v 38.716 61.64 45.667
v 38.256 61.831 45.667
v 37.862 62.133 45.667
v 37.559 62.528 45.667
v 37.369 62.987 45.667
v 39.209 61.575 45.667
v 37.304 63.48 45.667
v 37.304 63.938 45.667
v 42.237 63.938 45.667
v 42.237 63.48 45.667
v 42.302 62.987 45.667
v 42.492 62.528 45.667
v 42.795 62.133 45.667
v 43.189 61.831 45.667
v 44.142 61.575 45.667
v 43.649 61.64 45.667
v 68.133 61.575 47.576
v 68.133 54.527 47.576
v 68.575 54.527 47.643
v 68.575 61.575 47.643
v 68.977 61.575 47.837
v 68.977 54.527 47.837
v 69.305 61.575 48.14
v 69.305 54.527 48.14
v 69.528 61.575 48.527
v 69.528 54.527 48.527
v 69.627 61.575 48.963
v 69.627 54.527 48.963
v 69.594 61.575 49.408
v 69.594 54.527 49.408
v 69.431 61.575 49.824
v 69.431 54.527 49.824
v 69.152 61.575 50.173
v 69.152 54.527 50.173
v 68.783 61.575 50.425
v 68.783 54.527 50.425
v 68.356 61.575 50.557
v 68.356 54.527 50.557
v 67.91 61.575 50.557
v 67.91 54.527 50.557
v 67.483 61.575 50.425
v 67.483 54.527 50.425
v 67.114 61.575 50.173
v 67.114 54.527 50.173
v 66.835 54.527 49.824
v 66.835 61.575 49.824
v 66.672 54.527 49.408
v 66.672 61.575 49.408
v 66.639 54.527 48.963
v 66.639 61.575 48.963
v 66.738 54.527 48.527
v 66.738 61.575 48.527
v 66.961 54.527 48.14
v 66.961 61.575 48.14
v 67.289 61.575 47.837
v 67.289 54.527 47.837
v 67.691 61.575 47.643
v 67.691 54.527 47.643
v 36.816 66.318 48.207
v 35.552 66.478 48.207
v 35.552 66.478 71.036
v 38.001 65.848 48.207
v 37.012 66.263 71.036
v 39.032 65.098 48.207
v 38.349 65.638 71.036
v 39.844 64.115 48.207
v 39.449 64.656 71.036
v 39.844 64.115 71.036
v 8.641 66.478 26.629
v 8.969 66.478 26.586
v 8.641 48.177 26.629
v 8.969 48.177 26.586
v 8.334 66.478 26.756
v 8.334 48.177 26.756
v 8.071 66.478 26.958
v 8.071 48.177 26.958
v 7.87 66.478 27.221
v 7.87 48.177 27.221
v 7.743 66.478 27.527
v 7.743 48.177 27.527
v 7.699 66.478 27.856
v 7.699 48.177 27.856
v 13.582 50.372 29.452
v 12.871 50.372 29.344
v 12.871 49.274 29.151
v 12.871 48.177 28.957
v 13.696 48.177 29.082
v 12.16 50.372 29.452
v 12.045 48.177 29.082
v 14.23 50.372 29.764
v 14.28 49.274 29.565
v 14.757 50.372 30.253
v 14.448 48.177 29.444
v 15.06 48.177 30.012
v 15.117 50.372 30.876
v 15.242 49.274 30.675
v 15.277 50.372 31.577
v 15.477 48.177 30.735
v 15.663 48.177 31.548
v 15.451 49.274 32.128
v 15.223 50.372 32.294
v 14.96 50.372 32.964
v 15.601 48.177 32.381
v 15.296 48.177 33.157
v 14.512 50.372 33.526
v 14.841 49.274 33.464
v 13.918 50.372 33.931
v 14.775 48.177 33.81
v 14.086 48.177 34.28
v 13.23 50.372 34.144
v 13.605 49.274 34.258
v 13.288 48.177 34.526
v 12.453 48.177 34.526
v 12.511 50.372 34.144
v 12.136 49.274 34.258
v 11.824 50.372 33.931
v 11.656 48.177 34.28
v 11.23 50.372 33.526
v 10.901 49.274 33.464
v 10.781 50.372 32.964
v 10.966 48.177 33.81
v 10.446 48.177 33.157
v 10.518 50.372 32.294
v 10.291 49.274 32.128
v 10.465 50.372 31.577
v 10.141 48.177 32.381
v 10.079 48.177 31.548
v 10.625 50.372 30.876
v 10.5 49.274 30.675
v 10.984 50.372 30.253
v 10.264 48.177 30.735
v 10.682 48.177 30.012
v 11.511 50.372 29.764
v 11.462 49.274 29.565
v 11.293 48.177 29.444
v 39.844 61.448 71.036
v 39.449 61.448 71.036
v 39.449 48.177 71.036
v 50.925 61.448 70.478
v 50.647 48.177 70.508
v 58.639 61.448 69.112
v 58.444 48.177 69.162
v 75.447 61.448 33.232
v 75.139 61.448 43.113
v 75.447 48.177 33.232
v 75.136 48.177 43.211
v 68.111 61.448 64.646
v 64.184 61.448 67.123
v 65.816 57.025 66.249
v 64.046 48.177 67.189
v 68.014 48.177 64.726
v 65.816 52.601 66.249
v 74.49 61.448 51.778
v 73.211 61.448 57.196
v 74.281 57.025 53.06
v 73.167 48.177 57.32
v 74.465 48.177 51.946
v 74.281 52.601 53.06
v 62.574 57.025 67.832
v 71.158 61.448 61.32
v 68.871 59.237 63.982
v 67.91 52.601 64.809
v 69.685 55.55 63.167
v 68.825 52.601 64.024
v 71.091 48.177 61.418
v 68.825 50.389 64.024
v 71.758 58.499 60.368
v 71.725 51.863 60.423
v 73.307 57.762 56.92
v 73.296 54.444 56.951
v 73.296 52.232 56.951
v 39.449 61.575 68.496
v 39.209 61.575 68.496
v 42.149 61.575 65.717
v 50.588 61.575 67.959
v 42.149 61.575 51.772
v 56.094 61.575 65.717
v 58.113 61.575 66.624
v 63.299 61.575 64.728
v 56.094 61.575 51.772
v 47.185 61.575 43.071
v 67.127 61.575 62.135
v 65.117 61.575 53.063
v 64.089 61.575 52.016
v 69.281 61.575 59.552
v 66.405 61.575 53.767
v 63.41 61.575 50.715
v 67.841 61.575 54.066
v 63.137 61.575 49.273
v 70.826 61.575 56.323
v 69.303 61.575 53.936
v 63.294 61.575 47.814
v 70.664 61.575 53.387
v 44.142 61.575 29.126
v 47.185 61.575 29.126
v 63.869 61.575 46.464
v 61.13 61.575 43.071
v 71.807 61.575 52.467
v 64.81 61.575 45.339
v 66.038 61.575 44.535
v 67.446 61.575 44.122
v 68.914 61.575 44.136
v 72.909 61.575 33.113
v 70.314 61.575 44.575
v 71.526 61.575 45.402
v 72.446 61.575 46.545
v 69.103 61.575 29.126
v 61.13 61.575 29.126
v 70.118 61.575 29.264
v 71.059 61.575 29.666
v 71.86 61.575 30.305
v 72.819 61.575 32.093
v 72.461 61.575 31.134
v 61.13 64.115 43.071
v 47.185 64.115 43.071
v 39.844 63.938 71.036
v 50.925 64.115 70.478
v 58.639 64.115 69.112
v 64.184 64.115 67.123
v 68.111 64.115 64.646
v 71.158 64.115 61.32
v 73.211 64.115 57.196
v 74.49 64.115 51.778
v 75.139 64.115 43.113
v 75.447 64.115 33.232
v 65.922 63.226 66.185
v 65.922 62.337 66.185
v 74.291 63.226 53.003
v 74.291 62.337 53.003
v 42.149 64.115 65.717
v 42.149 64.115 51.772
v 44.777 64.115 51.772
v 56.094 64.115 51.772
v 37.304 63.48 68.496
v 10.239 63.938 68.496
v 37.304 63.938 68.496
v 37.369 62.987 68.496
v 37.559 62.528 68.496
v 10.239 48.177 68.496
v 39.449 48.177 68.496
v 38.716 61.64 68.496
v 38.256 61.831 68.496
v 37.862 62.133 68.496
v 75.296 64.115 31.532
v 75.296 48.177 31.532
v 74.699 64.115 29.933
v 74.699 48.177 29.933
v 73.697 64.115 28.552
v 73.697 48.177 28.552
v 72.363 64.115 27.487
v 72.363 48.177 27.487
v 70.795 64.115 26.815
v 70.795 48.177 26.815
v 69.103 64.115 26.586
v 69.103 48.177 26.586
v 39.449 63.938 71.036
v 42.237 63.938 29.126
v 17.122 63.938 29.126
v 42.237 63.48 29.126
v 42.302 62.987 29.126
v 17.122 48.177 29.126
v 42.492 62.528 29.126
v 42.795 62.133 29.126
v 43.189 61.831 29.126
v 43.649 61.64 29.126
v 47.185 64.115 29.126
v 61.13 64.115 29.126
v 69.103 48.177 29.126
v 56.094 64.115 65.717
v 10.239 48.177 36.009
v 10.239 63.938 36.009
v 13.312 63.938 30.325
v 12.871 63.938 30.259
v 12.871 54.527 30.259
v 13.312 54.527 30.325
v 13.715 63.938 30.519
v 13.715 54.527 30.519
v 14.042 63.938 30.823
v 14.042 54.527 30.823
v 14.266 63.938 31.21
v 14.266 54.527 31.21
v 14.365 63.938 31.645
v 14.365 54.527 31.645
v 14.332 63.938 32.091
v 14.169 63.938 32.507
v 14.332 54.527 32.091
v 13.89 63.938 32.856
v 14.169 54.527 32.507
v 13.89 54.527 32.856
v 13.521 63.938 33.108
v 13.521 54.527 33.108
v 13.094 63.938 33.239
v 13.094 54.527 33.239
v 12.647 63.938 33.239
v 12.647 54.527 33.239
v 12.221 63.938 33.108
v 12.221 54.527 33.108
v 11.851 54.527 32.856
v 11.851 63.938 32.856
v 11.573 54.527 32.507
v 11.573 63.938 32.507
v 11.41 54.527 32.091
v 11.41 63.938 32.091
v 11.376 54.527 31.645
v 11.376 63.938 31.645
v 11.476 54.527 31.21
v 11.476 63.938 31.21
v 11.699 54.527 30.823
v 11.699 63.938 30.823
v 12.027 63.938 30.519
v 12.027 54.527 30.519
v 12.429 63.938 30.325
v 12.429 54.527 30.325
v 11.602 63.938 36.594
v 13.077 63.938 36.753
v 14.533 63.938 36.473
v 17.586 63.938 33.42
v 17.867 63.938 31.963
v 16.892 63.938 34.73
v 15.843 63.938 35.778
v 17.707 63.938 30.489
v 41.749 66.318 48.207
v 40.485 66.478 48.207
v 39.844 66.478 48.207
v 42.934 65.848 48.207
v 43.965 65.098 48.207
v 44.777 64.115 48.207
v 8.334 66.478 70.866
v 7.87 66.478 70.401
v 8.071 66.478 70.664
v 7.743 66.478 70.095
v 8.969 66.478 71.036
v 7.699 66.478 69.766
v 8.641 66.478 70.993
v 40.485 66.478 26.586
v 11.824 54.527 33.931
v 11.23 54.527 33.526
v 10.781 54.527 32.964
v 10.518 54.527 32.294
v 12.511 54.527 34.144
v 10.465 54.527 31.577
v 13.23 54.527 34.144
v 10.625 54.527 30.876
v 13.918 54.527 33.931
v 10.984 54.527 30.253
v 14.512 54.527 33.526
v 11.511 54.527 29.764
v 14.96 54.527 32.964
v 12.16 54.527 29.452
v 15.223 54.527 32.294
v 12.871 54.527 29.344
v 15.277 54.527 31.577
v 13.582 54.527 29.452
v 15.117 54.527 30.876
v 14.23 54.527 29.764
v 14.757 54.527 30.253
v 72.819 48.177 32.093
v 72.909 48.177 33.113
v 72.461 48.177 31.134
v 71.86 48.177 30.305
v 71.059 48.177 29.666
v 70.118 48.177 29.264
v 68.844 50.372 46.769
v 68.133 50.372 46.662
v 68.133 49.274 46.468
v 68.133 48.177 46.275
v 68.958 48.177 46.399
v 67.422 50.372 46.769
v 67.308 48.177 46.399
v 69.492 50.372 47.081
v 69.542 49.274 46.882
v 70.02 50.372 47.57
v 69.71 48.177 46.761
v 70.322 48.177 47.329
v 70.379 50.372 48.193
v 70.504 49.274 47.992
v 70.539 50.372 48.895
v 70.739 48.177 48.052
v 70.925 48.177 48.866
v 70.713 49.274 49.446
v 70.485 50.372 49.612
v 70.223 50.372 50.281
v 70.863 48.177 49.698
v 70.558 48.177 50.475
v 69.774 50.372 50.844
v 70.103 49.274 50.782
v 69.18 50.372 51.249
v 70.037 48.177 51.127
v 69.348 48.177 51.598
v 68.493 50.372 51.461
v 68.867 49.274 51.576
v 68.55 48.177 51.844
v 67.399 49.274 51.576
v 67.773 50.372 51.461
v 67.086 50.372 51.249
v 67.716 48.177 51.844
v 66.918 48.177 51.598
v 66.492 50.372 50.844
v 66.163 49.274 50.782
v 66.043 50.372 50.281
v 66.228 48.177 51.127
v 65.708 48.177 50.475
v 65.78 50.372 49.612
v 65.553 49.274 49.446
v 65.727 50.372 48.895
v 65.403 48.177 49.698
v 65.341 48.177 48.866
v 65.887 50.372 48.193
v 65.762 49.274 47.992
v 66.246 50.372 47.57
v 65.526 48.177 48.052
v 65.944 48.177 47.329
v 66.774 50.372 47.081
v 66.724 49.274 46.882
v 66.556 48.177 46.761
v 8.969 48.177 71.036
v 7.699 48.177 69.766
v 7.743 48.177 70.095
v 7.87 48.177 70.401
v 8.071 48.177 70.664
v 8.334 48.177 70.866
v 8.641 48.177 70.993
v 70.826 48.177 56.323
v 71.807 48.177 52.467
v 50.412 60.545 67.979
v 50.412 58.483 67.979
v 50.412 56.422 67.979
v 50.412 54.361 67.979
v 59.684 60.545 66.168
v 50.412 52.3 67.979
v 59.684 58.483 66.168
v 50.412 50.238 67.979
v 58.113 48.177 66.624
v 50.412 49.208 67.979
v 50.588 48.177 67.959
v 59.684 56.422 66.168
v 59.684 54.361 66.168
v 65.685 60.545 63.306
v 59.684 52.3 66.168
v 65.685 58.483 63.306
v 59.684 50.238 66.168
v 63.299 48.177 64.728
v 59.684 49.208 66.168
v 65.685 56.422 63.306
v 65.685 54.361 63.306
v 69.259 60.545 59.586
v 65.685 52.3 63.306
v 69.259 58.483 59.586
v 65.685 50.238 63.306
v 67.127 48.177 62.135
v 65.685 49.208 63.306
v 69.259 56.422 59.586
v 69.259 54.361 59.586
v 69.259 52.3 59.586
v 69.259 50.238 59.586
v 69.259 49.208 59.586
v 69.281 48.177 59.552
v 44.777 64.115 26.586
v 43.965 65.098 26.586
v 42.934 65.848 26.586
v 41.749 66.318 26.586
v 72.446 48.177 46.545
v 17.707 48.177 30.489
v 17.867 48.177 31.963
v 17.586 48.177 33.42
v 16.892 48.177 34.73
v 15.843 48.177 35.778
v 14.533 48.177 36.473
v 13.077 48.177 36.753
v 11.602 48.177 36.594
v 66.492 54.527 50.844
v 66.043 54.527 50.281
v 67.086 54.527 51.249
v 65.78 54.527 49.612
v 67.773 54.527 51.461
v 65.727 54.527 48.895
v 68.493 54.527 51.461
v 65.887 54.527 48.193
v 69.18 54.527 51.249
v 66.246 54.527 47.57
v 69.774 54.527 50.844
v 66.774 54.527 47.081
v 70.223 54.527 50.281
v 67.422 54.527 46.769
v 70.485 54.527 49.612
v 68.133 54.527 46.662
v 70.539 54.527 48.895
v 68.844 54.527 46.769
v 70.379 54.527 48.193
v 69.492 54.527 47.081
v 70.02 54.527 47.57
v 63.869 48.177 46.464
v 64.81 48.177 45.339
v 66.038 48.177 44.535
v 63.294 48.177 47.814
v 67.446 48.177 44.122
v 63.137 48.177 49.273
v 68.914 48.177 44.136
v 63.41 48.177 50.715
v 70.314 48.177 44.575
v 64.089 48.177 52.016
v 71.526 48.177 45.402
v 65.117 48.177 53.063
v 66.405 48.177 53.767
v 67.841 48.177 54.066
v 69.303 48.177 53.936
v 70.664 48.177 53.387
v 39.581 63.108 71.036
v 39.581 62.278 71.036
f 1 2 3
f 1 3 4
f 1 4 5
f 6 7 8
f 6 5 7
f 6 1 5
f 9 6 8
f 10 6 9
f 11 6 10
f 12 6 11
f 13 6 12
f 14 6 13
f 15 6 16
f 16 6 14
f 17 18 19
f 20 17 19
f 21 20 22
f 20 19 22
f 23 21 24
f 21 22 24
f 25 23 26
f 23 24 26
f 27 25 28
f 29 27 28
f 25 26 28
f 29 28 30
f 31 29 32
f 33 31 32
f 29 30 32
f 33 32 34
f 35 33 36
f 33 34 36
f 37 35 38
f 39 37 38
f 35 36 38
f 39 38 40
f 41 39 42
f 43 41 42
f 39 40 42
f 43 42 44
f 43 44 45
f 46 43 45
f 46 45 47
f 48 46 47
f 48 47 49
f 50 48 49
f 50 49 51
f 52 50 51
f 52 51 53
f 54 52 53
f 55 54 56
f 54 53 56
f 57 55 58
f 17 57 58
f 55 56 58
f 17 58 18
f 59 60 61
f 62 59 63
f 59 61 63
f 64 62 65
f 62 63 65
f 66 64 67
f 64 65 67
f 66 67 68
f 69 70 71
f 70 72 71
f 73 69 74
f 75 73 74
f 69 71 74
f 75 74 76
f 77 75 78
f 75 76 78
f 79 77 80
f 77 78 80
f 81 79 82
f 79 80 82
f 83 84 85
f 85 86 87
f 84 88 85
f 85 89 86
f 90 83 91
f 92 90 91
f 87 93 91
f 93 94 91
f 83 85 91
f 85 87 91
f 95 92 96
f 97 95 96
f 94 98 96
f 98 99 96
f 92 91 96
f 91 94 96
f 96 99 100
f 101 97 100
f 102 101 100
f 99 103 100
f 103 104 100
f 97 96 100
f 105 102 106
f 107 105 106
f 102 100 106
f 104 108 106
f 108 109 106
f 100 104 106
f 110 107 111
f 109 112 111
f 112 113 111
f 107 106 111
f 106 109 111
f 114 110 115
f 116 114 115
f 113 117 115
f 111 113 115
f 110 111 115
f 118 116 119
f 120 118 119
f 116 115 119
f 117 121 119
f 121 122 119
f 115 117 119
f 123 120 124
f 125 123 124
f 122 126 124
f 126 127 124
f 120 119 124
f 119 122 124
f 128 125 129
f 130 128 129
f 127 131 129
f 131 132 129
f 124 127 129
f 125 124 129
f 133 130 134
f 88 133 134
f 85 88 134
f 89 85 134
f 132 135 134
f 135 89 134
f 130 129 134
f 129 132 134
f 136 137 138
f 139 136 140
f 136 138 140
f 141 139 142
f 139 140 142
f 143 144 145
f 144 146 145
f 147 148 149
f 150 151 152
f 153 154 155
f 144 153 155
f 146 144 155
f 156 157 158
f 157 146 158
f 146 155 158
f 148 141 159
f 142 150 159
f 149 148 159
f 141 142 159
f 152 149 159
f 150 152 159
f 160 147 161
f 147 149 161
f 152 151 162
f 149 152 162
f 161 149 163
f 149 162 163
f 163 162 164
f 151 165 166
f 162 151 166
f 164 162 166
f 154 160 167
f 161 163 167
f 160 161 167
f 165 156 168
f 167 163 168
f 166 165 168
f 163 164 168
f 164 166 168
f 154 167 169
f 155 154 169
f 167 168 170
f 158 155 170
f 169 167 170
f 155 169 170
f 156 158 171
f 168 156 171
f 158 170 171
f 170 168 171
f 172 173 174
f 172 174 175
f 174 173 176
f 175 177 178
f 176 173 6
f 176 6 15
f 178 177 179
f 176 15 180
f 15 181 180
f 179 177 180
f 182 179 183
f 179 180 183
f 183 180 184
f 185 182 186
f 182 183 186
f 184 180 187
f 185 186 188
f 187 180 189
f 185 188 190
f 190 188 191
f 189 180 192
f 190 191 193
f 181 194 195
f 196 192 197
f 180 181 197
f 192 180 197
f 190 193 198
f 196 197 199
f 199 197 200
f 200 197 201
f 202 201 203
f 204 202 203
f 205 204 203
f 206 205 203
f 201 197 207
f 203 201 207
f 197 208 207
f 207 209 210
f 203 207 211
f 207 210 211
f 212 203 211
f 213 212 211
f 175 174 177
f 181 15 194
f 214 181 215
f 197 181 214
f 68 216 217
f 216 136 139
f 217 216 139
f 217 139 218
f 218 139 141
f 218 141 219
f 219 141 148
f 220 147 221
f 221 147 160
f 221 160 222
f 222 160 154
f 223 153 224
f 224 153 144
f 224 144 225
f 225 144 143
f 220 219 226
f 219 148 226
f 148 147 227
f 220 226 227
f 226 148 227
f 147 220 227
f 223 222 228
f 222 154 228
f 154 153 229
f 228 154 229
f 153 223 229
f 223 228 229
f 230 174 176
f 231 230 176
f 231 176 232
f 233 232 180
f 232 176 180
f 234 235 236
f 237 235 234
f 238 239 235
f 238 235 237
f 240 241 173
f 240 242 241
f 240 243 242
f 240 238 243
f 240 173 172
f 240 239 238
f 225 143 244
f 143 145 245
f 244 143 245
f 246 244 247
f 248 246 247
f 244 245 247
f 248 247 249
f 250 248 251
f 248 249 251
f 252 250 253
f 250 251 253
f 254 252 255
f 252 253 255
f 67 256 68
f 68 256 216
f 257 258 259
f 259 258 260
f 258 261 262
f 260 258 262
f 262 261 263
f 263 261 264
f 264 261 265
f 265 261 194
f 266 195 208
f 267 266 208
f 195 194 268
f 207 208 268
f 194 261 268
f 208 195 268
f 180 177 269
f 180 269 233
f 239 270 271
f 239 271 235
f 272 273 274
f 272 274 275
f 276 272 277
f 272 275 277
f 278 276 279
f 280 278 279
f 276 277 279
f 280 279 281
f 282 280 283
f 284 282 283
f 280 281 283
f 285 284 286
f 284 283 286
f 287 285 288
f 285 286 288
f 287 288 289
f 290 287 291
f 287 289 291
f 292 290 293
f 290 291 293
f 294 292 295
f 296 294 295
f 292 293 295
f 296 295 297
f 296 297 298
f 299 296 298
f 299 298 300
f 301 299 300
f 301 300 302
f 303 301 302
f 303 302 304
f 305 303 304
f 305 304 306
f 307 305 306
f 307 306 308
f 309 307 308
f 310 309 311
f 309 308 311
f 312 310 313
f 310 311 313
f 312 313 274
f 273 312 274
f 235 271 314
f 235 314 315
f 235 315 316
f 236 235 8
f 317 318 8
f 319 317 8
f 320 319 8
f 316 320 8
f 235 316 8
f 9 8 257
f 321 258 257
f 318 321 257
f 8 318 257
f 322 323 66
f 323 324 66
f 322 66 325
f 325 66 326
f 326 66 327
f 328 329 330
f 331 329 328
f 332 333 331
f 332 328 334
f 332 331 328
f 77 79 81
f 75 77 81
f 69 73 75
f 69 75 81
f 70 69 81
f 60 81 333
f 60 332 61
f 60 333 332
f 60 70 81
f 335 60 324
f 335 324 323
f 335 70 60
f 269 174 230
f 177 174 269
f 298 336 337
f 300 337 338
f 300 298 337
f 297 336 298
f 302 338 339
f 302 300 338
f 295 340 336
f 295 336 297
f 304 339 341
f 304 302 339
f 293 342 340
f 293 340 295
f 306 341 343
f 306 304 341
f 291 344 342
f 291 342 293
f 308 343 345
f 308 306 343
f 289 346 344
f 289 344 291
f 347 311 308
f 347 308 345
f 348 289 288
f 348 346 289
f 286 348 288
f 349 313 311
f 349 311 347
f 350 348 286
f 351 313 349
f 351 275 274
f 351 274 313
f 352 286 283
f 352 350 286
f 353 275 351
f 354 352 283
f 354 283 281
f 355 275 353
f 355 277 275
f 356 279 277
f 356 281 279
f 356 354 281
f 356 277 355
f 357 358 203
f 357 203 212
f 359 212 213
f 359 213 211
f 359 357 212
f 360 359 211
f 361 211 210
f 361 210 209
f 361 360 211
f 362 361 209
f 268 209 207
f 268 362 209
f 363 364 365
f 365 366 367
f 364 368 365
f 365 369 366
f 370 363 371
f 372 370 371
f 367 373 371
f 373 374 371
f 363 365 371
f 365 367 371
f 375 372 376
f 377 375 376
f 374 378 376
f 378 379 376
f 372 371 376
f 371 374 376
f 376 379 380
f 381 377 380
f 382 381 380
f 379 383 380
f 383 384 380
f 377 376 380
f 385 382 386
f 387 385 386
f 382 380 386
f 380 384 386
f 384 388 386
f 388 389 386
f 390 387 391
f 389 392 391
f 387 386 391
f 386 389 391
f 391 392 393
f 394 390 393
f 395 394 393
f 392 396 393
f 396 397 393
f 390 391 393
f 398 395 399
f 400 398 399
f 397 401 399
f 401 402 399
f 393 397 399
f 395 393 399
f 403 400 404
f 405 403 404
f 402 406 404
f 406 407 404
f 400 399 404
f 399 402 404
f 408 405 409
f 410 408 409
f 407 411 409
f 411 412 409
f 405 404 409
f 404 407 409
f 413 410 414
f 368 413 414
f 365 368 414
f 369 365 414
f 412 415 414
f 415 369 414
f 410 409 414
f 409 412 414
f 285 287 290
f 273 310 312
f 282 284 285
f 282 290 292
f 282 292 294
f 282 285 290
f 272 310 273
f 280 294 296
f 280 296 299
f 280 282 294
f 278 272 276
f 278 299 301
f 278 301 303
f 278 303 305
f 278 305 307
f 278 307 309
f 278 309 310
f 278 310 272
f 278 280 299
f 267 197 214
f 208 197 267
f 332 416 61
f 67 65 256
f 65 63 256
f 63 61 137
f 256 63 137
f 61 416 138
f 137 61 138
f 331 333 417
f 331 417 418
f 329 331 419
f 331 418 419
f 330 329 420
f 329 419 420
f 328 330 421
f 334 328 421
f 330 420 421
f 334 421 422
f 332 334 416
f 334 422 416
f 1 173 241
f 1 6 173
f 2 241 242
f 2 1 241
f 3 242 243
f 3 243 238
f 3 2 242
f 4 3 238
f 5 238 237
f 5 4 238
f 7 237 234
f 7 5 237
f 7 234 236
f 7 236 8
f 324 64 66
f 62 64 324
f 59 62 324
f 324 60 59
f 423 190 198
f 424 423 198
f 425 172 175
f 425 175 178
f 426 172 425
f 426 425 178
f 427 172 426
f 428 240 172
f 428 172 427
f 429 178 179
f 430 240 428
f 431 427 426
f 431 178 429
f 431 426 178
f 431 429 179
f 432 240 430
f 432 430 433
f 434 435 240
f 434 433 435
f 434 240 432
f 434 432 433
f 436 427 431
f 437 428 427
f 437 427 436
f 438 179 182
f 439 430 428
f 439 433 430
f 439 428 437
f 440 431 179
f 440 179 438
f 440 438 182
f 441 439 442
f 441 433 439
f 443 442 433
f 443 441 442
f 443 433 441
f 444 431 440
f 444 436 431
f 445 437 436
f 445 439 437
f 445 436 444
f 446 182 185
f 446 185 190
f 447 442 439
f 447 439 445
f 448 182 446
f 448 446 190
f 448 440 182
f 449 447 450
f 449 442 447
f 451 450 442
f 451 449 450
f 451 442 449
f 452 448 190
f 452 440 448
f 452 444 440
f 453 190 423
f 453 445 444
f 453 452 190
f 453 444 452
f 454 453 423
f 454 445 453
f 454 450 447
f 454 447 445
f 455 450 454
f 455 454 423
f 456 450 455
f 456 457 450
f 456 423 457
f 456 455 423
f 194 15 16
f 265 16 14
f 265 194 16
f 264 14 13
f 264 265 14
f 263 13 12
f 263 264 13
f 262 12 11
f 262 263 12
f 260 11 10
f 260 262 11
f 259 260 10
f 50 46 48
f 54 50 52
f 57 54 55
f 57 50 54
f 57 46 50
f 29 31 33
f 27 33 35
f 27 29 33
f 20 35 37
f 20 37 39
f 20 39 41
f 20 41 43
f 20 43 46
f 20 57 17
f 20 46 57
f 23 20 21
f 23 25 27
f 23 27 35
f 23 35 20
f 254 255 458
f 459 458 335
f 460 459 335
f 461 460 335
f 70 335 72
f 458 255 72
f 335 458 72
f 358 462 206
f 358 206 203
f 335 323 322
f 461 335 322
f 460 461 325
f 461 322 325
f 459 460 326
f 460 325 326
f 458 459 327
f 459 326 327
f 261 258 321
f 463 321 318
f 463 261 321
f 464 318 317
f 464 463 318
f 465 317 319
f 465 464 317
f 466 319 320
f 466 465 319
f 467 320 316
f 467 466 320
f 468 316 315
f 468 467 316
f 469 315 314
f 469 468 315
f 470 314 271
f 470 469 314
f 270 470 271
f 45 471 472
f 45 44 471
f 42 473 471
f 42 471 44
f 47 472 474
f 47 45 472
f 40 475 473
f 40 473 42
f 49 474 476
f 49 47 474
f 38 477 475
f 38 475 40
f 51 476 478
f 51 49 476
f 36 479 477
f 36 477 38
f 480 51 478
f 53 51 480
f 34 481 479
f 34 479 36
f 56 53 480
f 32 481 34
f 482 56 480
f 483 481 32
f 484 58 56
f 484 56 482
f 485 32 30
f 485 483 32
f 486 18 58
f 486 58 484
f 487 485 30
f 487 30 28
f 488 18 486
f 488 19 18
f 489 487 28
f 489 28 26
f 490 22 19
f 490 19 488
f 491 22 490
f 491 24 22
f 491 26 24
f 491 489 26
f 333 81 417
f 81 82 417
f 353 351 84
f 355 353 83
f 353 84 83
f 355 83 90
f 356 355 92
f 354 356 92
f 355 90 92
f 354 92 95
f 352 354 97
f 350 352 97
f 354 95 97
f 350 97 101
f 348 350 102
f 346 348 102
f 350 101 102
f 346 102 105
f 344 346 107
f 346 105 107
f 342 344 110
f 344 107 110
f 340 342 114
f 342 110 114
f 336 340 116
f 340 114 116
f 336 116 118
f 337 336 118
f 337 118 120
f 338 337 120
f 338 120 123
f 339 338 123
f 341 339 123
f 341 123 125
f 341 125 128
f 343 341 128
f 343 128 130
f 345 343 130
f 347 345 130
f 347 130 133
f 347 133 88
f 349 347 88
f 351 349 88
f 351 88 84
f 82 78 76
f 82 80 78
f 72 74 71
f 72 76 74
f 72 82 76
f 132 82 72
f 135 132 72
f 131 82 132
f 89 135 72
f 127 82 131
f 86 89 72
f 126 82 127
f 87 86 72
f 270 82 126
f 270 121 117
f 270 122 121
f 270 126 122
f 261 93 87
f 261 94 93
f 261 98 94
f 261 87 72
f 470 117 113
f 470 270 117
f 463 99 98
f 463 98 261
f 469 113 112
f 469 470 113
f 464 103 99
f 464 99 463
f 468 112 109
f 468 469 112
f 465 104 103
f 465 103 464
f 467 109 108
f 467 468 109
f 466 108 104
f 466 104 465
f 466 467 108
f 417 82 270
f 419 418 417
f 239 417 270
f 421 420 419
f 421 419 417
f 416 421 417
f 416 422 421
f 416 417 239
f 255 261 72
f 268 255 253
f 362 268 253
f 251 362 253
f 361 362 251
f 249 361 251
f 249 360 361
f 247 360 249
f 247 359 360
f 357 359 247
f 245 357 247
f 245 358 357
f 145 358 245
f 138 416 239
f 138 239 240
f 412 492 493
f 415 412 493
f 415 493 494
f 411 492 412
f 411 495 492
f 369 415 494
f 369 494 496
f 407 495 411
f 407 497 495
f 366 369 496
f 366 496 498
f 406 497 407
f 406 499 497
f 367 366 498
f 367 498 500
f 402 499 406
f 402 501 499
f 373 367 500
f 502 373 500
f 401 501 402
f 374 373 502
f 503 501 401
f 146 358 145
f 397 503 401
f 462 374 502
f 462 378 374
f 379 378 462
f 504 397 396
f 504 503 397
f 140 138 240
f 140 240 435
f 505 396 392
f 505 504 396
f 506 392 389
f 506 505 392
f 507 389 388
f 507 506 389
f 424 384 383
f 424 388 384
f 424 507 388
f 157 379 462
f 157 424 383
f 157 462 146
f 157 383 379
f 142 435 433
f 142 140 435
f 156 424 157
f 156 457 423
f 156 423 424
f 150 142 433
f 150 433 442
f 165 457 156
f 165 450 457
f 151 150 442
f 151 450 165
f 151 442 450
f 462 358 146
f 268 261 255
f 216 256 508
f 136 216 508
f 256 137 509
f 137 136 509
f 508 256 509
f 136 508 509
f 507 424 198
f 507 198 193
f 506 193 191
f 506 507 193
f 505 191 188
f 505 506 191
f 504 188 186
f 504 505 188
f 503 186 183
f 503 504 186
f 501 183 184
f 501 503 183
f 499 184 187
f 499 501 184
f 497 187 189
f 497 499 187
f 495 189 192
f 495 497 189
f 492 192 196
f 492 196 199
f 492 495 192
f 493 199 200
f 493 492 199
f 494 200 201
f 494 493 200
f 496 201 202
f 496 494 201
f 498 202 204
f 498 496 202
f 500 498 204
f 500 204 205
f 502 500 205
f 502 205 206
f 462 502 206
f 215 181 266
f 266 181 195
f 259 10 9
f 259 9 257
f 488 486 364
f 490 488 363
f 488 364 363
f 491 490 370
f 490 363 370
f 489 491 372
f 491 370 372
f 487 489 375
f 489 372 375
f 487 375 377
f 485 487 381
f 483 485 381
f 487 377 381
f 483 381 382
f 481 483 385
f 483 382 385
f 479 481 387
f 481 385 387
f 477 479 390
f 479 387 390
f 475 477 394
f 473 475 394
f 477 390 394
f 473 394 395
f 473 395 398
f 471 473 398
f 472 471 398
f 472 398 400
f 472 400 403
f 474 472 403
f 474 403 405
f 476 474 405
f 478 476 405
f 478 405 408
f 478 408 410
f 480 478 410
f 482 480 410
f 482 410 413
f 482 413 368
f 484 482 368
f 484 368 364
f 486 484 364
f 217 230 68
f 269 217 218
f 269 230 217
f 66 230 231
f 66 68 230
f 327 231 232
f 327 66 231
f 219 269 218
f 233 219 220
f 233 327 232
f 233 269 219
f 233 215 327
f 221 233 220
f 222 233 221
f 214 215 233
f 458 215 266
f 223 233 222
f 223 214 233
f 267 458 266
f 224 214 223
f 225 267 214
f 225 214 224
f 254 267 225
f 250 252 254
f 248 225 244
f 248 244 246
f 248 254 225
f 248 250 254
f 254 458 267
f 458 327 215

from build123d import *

# Parameters (mm, degrees)
BUTTONHEIGHTADJUSTMENT_DEPTH          = 13.2715
DUPONTCONNECTORHEIGHTADJUSTMENT_DEPTH = 2.4892
ADDINGTOPTHICKNESS_DUPONT_DEPTH       = 2.54
ADDINGTOPTHICKNESS_BUTTON_DEPTH       = 2.667
SHELL1_START                          = 48.176932074
SHELL1_DEPTH                          = 13.3985
SHELL1_START_2                        = 61.575432074
SHELL1_2_DEPTH                        = 2.3622
BUTTONOPENINGS_DEPTH                  = 105.849340515
BUTTONOPENINGS_DEPTH_BACK             = 105.849340515
SKETCH4_W                             = 13.944930934
SKETCH4_H                             = 13.944930934
SKETCH4_W_2                           = 13.944930933
FILLET1_R                             = 5.08
FILLET2_R                             = 5.08
FILLET3_R                             = 1.905
BOSS_EXTRUDE5_REACH                   = 107.234
SKETCH7_R                             = 5
SKETCH7_3_R                           = 2.413
CUT_EXTRUDE2_DEPTH                    = 6.35
SKETCH8_R                             = 1.4986
CUT_EXTRUDE3_DEPTH                    = 9.4107
SKETCH8_3_R                           = 1.4986
CUT_EXTRUDE4_DEPTH                    = 7.0485


# Read off the part's stored shape, not the designer's step: Shell1
with BuildPart() as part:
    # Sketch1 → ButtonHeightAdjustment (new body)
    with BuildSketch(Plane(origin=(0, 48.176932074, 0), x_dir=(1, 0, 0), z_dir=(0, 1, 0))):
        with BuildLine():
            Line((7.699380634, -27.856075324), (7.699380634, -69.766075324))
            ThreePointArc((7.699380634, -69.766075324), (8.071355022, -70.664100937), (8.969380634, -71.036075324))
            Line((8.969380634, -71.036075324), (39.449380634, -71.036075324))
            add(Edge.make_bspline(
                [(39.449380634, -71.036075324), (78.302087084, -71.036075324), (74.39537319, -55.792900821), (75.446576955, -33.231621959)],
                knots=[0.087040061, 0.087040061, 0.087040061, 0.087040061, 1, 1, 1, 1], degree=3))
            ThreePointArc((75.446576955, -33.231621959), (73.696889706, -28.551683755), (69.103458465, -26.586075324))
            Line((69.103458465, -26.586075324), (8.969380634, -26.586075324))
            ThreePointArc((8.969380634, -26.586075324), (8.071355022, -26.958049712), (7.699380634, -27.856075324))
        make_face()
    extrude(amount=BUTTONHEIGHTADJUSTMENT_DEPTH)

    # Sketch2 → DupontConnectorHeightAdjustment (add)
    with BuildSketch(Plane(origin=(0, 61.448432074, 0), x_dir=(1, 0, 0), z_dir=(0, 1, 0))):
        with BuildLine():
            add(Edge.make_bspline(
                [(39.449380634, -71.036075324), (39.581316275, -71.036075324), (39.712758839, -71.035899549), (39.843710197, -71.03554831)],
                knots=[0.087040061, 0.087040061, 0.087040061, 0.087040061, 0.090140281, 0.090140281, 0.090140281, 0.090140281], degree=3))
            Line((39.843710197, -71.03554831), (39.843710197, -48.207398996))
            Line((39.843710197, -48.207398996), (44.776624411, -48.207398996))
            Line((44.776624411, -48.207398996), (44.776624411, -26.586075324))
            Line((44.776624411, -26.586075324), (8.969380634, -26.586075324))
            ThreePointArc((8.969380634, -26.586075324), (8.071355022, -26.958049712), (7.699380634, -27.856075324))
            Line((7.699380634, -27.856075324), (7.699380634, -69.766075324))
            ThreePointArc((7.699380634, -69.766075324), (8.071355022, -70.664100937), (8.969380634, -71.036075324))
            Line((8.969380634, -71.036075324), (39.449380634, -71.036075324))
        make_face()
    extrude(amount=DUPONTCONNECTORHEIGHTADJUSTMENT_DEPTH)

    # Sketch3 → AddingTopThickness_Dupont (add)
    with BuildSketch(Plane(origin=(0, 63.937632074, 0), x_dir=(1, 0, 0), z_dir=(0, 1, 0))):
        with BuildLine():
            Line((39.843710197, -48.207398996), (44.776624411, -48.207398996))
            Line((44.776624411, -48.207398996), (44.776624411, -26.586075324))
            Line((44.776624411, -26.586075324), (8.969380634, -26.586075324))
            ThreePointArc((8.969380634, -26.586075324), (8.071355022, -26.958049712), (7.699380634, -27.856075324))
            Line((7.699380634, -27.856075324), (7.699380634, -69.766075324))
            ThreePointArc((7.699380634, -69.766075324), (8.071355022, -70.664100937), (8.969380634, -71.036075324))
            Line((8.969380634, -71.036075324), (39.449380634, -71.036075324))
            add(Edge.make_bspline(
                [(39.449380634, -71.036075324), (39.581316276, -71.036075324), (39.712758842, -71.035899549), (39.8437102, -71.03554831)],
                knots=[0.087040061, 0.087040061, 0.087040061, 0.087040061, 0.090140281, 0.090140281, 0.090140281, 0.090140281], degree=3))
            Line((39.8437102, -71.03554831), (39.843710197, -48.207398996))
        make_face()
    extrude(amount=ADDINGTOPTHICKNESS_DUPONT_DEPTH)

    # Sketch5 → AddingTopThickness_Button (add)
    with BuildSketch(Plane(origin=(0, 61.448432074, 0), x_dir=(1, 0, 0), z_dir=(0, 1, 0))):
        with BuildLine():
            Line((39.843710197, -48.207398996), (39.8437102, -71.03554831))
            add(Edge.make_bspline(
                [(39.8437102, -71.03554831), (78.275611493, -70.93246569), (74.398942858, -55.71628745), (75.446576955, -33.231621959)],
                knots=[0.090140281, 0.090140281, 0.090140281, 0.090140281, 1, 1, 1, 1], degree=3))
            ThreePointArc((75.446576955, -33.231621959), (73.696889706, -28.551683755), (69.103458465, -26.586075324))
            Line((69.103458465, -26.586075324), (44.776624411, -26.586075324))
            Line((44.776624411, -26.586075324), (44.776624411, -48.207398996))
            Line((44.776624411, -48.207398996), (39.843710197, -48.207398996))
        make_face()
    extrude(amount=ADDINGTOPTHICKNESS_BUTTON_DEPTH)

    # Shell1 outline → Shell1 (cut)
    with BuildSketch(Plane(origin=(0, 0, 0), x_dir=(1, 0, 0), z_dir=(0, 1, 0)).offset(SHELL1_START)):
        with BuildLine():
            add(Edge.make_bspline(
                [(39.449379827, -68.496075324), (39.449586547, -68.496075324), (39.449791514, -68.496075324), (39.449995043, -68.496075324), (39.450199135, -68.496075323), (39.450405991, -68.496075321), (39.450613287, -68.49607532), (39.450814961, -68.496075318), (39.45101783, -68.496075316), (39.451228774, -68.496075313), (39.451429783, -68.49607531), (39.451635772, -68.496075307), (39.452137481, -68.496075299), (39.452434182, -68.496075293), (39.452730881, -68.496075287), (39.453027578, -68.49607528), (39.453324273, -68.496075272), (39.453620966, -68.496075264), (39.453917657, -68.496075255), (39.454214347, -68.496075245), (39.454511034, -68.496075235), (39.454807719, -68.496075224), (39.455104403, -68.496075212), (39.455994447, -68.496075176), (39.456587802, -68.496075149), (39.45718115, -68.496075119), (39.45777449, -68.496075087), (39.458367822, -68.496075051), (39.458961146, -68.496075014), (39.459554462, -68.496074974), (39.460147771, -68.496074931), (39.460741072, -68.496074885), (39.461334366, -68.496074837), (39.461927651, -68.496074786), (39.463707485, -68.496074626), (39.46489401, -68.496074509), (39.466080504, -68.496074381), (39.467266967, -68.496074242), (39.468453399, -68.496074094), (39.4696398, -68.496073934), (39.47082617, -68.496073764), (39.472012509, -68.496073584), (39.473198817, -68.496073393), (39.474385095, -68.496073191), (39.475571341, -68.496072979), (39.479129987, -68.496072311), (39.481502294, -68.496071824), (39.483874478, -68.496071295), (39.486246537, -68.496070723), (39.488618473, -68.49607011), (39.490990286, -68.496069454), (39.493361974, -68.496068756), (39.495733539, -68.496068017), (39.49810498, -68.496067235), (39.500476297, -68.496066411), (39.50284749, -68.496065545), (39.514702839, -68.496061004), (39.524185139, -68.496056698), (39.53366546, -68.496051718), (39.543143801, -68.496046066), (39.552620163, -68.49603974), (39.562094547, -68.496032741), (39.571566952, -68.496025069), (39.581037379, -68.496016724), (39.590505827, -68.496007706), (39.599972298, -68.495998014), (39.609436791, -68.49598765), (39.656749367, -68.495932466), (39.694567786, -68.495877552), (39.732354575, -68.495811875), (39.770109747, -68.495735439), (39.807833313, -68.495648246), (39.845525286, -68.495550299), (39.883185678, -68.495441603), (39.9208145, -68.495322159), (39.958411766, -68.495191972), (39.995977486, -68.495051044), (40.033511673, -68.494899378), (40.146019672, -68.494412178), (40.22089892, -68.49404444), (40.295652182, -68.49363379), (40.370279553, -68.493180254), (40.444781129, -68.492683856), (40.519157007, -68.492144625), (40.593407283, -68.491562584), (40.667532053, -68.49093776), (40.741531414, -68.490270178), (40.815405462, -68.489559865), (40.889154293, -68.488806846), (41.257272849, -68.484828347), (41.549765836, -68.480962528), (41.840263075, -68.476415439), (42.128770675, -68.471188833), (42.415294743, -68.46528446), (42.699841389, -68.458704073), (42.982416721, -68.451449422), (43.263026848, -68.443522258), (43.541677878, -68.434924334), (43.81837592, -68.425657399), (44.093127082, -68.415723207), (44.911558257, -68.383924109), (45.449415797, -68.360063452), (45.979558488, -68.333556107), (46.502034658, -68.304417105), (47.016892561, -68.272661946), (47.524180382, -68.238306591), (48.023946236, -68.201367465), (48.516238167, -68.161861458), (49.001104147, -68.119805924), (49.478592082, -68.075218681), (49.948749802, -68.028118011), (51.337375611, -67.879331956), (52.233996985, -67.770162893), (53.10187272, -67.65116783), (53.941387356, -67.522507203), (54.752927499, -67.384351455), (55.536883515, -67.23688237), (56.29365187, -67.080293824), (57.023638097, -66.914791937), (57.72726042, -66.740594643), (58.404954001, -66.557930666), (59.057175843, -66.367037906), (60.938879277, -65.770407902), (62.093404567, -65.34071881), (63.151826299, -64.881036106), (64.118529707, -64.39342752), (64.99834488, -63.879851847), (65.796921512, -63.342095032), (66.520883858, -62.781316869), (67.177505422, -62.197416382), (67.77398037, -61.588740771), (68.316609285, -60.952528366), (68.810360599, -60.285890342), (70.157226589, -58.18651634), (70.875939498, -56.654313157), (71.447642543, -54.967962519), (71.889256902, -53.108637628), (72.201031894, -51.080028633), (72.410024806, -48.90317794), (72.536553408, -46.578549842), (72.608216265, -44.123137631), (72.652402144, -41.540781475), (72.697717647, -38.840812898), (72.773461503, -36.029447938), (72.909329559, -33.113403305)],
                knots=[0.087040061, 0.087040061, 0.087040061, 0.087040061, 0.087040061, 0.087040061, 0.087040061, 0.087040061, 0.087040061, 0.087040061, 0.087040061, 0.087040061, 0.087040061, 0.087059666, 0.087059666, 0.087059666, 0.087059666, 0.087059666, 0.087059666, 0.087059666, 0.087059666, 0.087059666, 0.087059666, 0.087059666, 0.08708804, 0.08708804, 0.08708804, 0.08708804, 0.08708804, 0.08708804, 0.08708804, 0.08708804, 0.08708804, 0.08708804, 0.08708804, 0.087144789, 0.087144789, 0.087144789, 0.087144789, 0.087144789, 0.087144789, 0.087144789, 0.087144789, 0.087144789, 0.087144789, 0.087144789, 0.087258286, 0.087258286, 0.087258286, 0.087258286, 0.087258286, 0.087258286, 0.087258286, 0.087258286, 0.087258286, 0.087258286, 0.087258286, 0.087485279, 0.087485279, 0.087485279, 0.087485279, 0.087485279, 0.087485279, 0.087485279, 0.087485279, 0.087485279, 0.087485279, 0.087485279, 0.088393254, 0.088393254, 0.088393254, 0.088393254, 0.088393254, 0.088393254, 0.088393254, 0.088393254, 0.088393254, 0.088393254, 0.088393254, 0.092025154, 0.092025154, 0.092025154, 0.092025154, 0.092025154, 0.092025154, 0.092025154, 0.092025154, 0.092025154, 0.092025154, 0.092025154, 0.099288952, 0.099288952, 0.099288952, 0.099288952, 0.099288952, 0.099288952, 0.099288952, 0.099288952, 0.099288952, 0.099288952, 0.099288952, 0.128344147, 0.128344147, 0.128344147, 0.128344147, 0.128344147, 0.128344147, 0.128344147, 0.128344147, 0.128344147, 0.128344147, 0.128344147, 0.186454538, 0.186454538, 0.186454538, 0.186454538, 0.186454538, 0.186454538, 0.186454538, 0.186454538, 0.186454538, 0.186454538, 0.186454538, 0.302675318, 0.302675318, 0.302675318, 0.302675318, 0.302675318, 0.302675318, 0.302675318, 0.302675318, 0.302675318, 0.302675318, 0.302675318, 0.535116879, 0.535116879, 0.535116879, 0.535116879, 0.535116879, 0.535116879, 0.535116879, 0.535116879, 0.535116879, 0.535116879, 0.535116879, 1, 1, 1, 1, 1, 1, 1, 1, 1, 1, 1, 1, 1], degree=12))
            ThreePointArc((72.909329559, -33.113403305), (71.859517209, -30.305440383), (69.103458465, -29.126075324))
            Line((69.103458465, -29.126075324), (10.239380634, -29.126075324))
            Line((10.239380634, -29.126075324), (10.239380634, -68.496075324))
            Line((10.239380634, -68.496075324), (39.449379827, -68.496075324))
        make_face()
    extrude(amount=SHELL1_DEPTH, mode=Mode.SUBTRACT)

    # Shell1 2 outline → Shell1 2 (cut)
    with BuildSketch(Plane(origin=(0, 0, 0), x_dir=(1, 0, 0), z_dir=(0, 1, 0)).offset(SHELL1_START_2)):
        Polygon((10.239380634, -68.496075324), (37.303710197, -68.496075324), (37.303710197, -45.667398996), (42.236624411, -45.667398996), (42.236624411, -29.126075324), (10.239380634, -29.126075324), align=None)
    extrude(amount=SHELL1_2_DEPTH, mode=Mode.SUBTRACT)

    # Sketch4 → ButtonOpenings (cut, two sides: drawn at the far end of the back side and taken through both)
    with BuildSketch(Plane(origin=(0, 64.115432074, 0), x_dir=(1, 0, 0), z_dir=(0, 1, 0)).offset(-BUTTONOPENINGS_DEPTH_BACK)):
        with Locations((54.157415047, -36.098540791)):
            Rectangle(SKETCH4_W, SKETCH4_H)
        with Locations((49.121503178, -58.744823399)):
            Rectangle(SKETCH4_W_2, SKETCH4_H)
    extrude(amount=BUTTONOPENINGS_DEPTH + BUTTONOPENINGS_DEPTH_BACK, mode=Mode.SUBTRACT)

    # Fillet1
    # the kernel refuses this fillet: 5.08 mm, written as the material it takes off along each edge
    with BuildSketch(Plane(origin=(39.843710202, 66.477632074, 81.765169447), x_dir=(0, -1, 0), z_dir=(-1.4390201579738435e-10, 0, -1.0))) as fillet1_piece_1:
        with BuildLine():
            CenterArc((5.08, 4.291848455), FILLET1_R, 180, 57.656088587)
            Line((0, 4.291848455), (-0.1016, 4.291848455))
            Line((-0.1016, 4.291848455), (-0.1016, 0))
            Line((-0.1016, 0), (0, -0.1016))
            ThreePointArc((0, -0.1016), (1.1811, -0.1016), (2.307844, -0.085836969))
            Line((2.307844, -0.085836969), (2.3622, 0))
        make_face()
    extrude(amount=33.557770451, mode=Mode.SUBTRACT)

    # Fillet2
    # the kernel refuses this fillet: 5.08 mm, written as the material it takes off along each edge
    with BuildSketch(Plane(origin=(44.776624411, 66.477632074, 58.937020134), x_dir=(-1, 0, 0), z_dir=(0, 0, -1))) as fillet2_piece_1:
        with BuildLine():
            CenterArc((4.291848455, -5.08), FILLET2_R, 90, 57.656088587)
            Line((0, -2.3622), (-0.085836969, -2.307844))
            ThreePointArc((-0.085836969, -2.307844), (-0.1016, -1.1811), (-0.1016, 0))
            Line((-0.1016, 0), (0, 0.1016))
            Line((0, 0.1016), (4.291848455, 0.1016))
            Line((4.291848455, 0.1016), (4.291848455, 0))
        make_face()
    extrude(amount=43.080565947, mode=Mode.SUBTRACT)

    # Fillet3
    fillet3_edges = [part.edges().sort_by_distance(p)[0] for p in [
        (37.303710197, 61.575432074, 57.08173716),
        (42.236624411, 61.575432074, 37.39673716),
    ]]
    fillet(fillet3_edges, radius=FILLET3_R)

    # Sketch7 → Boss-Extrude5 (add, up to next)
    with BuildSketch(Plane.XZ.offset(-48.176932074), mode=Mode.PRIVATE) as boss_extrude5_sk1:
        with Locations((12.870767082, 31.757461772)):
            Circle(SKETCH7_R)
    boss_extrude5_tool1 = extrude(boss_extrude5_sk1.sketch, amount=-BOSS_EXTRUDE5_REACH, mode=Mode.PRIVATE) - part.part
    # Sketch7 → Boss-Extrude5 (add, up to next)
    with BuildSketch(Plane.XZ.offset(-48.176932074), mode=Mode.PRIVATE) as boss_extrude5_sk2:
        with Locations((68.132943539, 49.074850698)):
            Circle(SKETCH7_R)
    boss_extrude5_tool2 = extrude(boss_extrude5_sk2.sketch, amount=-BOSS_EXTRUDE5_REACH, mode=Mode.PRIVATE) - part.part
    add(boss_extrude5_tool1.solids().sort_by_distance((12.870767, 48.176932, 31.757462))[0])
    add(boss_extrude5_tool2.solids().sort_by_distance((68.132944, 48.176932, 49.074851))[0])

    # Sketch7<3> → Cut-Extrude2 (cut)
    with BuildSketch(Plane.XZ.offset(-48.176932074)):
        with Locations(Location((12.870767082, 31.757461772, 0), (0, 0, 270))):
            Circle(SKETCH7_3_R)
        with Locations(Location((68.132943539, 49.074850698, 0), (0, 0, 270))):
            Circle(SKETCH7_3_R)
    extrude(amount=-CUT_EXTRUDE2_DEPTH, mode=Mode.SUBTRACT)

    # Sketch8 → Cut-Extrude3 (cut)
    with BuildSketch(Plane.XZ.offset(-54.526932074)):
        with Locations(Location((12.870767082, 31.757461772, 0), (0, 0, 270))):
            Circle(SKETCH8_R)
    extrude(amount=-CUT_EXTRUDE3_DEPTH, mode=Mode.SUBTRACT)

    # Sketch8<3> → Cut-Extrude4 (cut)
    with BuildSketch(Plane.XZ.offset(-54.526932074)):
        with Locations(Location((68.132943539, 49.074850698, 0), (0, 0, 270))):
            Circle(SKETCH8_3_R)
    extrude(amount=-CUT_EXTRUDE4_DEPTH, mode=Mode.SUBTRACT)

    # Sketch10 → Cut-Revolve1 (revolve, cut)
    with BuildSketch(Plane(origin=(68.132943539, 0, 0), x_dir=(0, -1, 0), z_dir=(-1, 0, 0)), mode=Mode.PRIVATE) as cut_revolve1_sk:
        Polygon((-54.526932074, 50.75517437), (-48.176932074, 51.874850698), (-48.176932074, 49.074850698), (-54.526932074, 49.074850698), align=None)
    revolve(cut_revolve1_sk.sketch.rotate(Axis((68.132943539, 54.526932074, 49.074850698), (0, -1, 0)), 180), axis=Axis((68.132943539, 54.526932074, 49.074850698), (0, -1, 0)), mode=Mode.SUBTRACT)

    # Sketch11 → Cut-Revolve2 (revolve, cut)
    with BuildSketch(Plane(origin=(12.870767082, 0, 0), x_dir=(0, -1, 0), z_dir=(-1, 0, 0)), mode=Mode.PRIVATE) as cut_revolve2_sk:
        Polygon((-54.526932074, 33.437785445), (-48.176932074, 34.557461772), (-48.176932074, 31.757461772), (-54.526932074, 31.757461772), align=None)
    revolve(cut_revolve2_sk.sketch.rotate(Axis((12.870767082, 54.526932074, 31.757461772), (0, -1, 0)), 180), axis=Axis((12.870767082, 54.526932074, 31.757461772), (0, -1, 0)), mode=Mode.SUBTRACT)


solid = part.part
